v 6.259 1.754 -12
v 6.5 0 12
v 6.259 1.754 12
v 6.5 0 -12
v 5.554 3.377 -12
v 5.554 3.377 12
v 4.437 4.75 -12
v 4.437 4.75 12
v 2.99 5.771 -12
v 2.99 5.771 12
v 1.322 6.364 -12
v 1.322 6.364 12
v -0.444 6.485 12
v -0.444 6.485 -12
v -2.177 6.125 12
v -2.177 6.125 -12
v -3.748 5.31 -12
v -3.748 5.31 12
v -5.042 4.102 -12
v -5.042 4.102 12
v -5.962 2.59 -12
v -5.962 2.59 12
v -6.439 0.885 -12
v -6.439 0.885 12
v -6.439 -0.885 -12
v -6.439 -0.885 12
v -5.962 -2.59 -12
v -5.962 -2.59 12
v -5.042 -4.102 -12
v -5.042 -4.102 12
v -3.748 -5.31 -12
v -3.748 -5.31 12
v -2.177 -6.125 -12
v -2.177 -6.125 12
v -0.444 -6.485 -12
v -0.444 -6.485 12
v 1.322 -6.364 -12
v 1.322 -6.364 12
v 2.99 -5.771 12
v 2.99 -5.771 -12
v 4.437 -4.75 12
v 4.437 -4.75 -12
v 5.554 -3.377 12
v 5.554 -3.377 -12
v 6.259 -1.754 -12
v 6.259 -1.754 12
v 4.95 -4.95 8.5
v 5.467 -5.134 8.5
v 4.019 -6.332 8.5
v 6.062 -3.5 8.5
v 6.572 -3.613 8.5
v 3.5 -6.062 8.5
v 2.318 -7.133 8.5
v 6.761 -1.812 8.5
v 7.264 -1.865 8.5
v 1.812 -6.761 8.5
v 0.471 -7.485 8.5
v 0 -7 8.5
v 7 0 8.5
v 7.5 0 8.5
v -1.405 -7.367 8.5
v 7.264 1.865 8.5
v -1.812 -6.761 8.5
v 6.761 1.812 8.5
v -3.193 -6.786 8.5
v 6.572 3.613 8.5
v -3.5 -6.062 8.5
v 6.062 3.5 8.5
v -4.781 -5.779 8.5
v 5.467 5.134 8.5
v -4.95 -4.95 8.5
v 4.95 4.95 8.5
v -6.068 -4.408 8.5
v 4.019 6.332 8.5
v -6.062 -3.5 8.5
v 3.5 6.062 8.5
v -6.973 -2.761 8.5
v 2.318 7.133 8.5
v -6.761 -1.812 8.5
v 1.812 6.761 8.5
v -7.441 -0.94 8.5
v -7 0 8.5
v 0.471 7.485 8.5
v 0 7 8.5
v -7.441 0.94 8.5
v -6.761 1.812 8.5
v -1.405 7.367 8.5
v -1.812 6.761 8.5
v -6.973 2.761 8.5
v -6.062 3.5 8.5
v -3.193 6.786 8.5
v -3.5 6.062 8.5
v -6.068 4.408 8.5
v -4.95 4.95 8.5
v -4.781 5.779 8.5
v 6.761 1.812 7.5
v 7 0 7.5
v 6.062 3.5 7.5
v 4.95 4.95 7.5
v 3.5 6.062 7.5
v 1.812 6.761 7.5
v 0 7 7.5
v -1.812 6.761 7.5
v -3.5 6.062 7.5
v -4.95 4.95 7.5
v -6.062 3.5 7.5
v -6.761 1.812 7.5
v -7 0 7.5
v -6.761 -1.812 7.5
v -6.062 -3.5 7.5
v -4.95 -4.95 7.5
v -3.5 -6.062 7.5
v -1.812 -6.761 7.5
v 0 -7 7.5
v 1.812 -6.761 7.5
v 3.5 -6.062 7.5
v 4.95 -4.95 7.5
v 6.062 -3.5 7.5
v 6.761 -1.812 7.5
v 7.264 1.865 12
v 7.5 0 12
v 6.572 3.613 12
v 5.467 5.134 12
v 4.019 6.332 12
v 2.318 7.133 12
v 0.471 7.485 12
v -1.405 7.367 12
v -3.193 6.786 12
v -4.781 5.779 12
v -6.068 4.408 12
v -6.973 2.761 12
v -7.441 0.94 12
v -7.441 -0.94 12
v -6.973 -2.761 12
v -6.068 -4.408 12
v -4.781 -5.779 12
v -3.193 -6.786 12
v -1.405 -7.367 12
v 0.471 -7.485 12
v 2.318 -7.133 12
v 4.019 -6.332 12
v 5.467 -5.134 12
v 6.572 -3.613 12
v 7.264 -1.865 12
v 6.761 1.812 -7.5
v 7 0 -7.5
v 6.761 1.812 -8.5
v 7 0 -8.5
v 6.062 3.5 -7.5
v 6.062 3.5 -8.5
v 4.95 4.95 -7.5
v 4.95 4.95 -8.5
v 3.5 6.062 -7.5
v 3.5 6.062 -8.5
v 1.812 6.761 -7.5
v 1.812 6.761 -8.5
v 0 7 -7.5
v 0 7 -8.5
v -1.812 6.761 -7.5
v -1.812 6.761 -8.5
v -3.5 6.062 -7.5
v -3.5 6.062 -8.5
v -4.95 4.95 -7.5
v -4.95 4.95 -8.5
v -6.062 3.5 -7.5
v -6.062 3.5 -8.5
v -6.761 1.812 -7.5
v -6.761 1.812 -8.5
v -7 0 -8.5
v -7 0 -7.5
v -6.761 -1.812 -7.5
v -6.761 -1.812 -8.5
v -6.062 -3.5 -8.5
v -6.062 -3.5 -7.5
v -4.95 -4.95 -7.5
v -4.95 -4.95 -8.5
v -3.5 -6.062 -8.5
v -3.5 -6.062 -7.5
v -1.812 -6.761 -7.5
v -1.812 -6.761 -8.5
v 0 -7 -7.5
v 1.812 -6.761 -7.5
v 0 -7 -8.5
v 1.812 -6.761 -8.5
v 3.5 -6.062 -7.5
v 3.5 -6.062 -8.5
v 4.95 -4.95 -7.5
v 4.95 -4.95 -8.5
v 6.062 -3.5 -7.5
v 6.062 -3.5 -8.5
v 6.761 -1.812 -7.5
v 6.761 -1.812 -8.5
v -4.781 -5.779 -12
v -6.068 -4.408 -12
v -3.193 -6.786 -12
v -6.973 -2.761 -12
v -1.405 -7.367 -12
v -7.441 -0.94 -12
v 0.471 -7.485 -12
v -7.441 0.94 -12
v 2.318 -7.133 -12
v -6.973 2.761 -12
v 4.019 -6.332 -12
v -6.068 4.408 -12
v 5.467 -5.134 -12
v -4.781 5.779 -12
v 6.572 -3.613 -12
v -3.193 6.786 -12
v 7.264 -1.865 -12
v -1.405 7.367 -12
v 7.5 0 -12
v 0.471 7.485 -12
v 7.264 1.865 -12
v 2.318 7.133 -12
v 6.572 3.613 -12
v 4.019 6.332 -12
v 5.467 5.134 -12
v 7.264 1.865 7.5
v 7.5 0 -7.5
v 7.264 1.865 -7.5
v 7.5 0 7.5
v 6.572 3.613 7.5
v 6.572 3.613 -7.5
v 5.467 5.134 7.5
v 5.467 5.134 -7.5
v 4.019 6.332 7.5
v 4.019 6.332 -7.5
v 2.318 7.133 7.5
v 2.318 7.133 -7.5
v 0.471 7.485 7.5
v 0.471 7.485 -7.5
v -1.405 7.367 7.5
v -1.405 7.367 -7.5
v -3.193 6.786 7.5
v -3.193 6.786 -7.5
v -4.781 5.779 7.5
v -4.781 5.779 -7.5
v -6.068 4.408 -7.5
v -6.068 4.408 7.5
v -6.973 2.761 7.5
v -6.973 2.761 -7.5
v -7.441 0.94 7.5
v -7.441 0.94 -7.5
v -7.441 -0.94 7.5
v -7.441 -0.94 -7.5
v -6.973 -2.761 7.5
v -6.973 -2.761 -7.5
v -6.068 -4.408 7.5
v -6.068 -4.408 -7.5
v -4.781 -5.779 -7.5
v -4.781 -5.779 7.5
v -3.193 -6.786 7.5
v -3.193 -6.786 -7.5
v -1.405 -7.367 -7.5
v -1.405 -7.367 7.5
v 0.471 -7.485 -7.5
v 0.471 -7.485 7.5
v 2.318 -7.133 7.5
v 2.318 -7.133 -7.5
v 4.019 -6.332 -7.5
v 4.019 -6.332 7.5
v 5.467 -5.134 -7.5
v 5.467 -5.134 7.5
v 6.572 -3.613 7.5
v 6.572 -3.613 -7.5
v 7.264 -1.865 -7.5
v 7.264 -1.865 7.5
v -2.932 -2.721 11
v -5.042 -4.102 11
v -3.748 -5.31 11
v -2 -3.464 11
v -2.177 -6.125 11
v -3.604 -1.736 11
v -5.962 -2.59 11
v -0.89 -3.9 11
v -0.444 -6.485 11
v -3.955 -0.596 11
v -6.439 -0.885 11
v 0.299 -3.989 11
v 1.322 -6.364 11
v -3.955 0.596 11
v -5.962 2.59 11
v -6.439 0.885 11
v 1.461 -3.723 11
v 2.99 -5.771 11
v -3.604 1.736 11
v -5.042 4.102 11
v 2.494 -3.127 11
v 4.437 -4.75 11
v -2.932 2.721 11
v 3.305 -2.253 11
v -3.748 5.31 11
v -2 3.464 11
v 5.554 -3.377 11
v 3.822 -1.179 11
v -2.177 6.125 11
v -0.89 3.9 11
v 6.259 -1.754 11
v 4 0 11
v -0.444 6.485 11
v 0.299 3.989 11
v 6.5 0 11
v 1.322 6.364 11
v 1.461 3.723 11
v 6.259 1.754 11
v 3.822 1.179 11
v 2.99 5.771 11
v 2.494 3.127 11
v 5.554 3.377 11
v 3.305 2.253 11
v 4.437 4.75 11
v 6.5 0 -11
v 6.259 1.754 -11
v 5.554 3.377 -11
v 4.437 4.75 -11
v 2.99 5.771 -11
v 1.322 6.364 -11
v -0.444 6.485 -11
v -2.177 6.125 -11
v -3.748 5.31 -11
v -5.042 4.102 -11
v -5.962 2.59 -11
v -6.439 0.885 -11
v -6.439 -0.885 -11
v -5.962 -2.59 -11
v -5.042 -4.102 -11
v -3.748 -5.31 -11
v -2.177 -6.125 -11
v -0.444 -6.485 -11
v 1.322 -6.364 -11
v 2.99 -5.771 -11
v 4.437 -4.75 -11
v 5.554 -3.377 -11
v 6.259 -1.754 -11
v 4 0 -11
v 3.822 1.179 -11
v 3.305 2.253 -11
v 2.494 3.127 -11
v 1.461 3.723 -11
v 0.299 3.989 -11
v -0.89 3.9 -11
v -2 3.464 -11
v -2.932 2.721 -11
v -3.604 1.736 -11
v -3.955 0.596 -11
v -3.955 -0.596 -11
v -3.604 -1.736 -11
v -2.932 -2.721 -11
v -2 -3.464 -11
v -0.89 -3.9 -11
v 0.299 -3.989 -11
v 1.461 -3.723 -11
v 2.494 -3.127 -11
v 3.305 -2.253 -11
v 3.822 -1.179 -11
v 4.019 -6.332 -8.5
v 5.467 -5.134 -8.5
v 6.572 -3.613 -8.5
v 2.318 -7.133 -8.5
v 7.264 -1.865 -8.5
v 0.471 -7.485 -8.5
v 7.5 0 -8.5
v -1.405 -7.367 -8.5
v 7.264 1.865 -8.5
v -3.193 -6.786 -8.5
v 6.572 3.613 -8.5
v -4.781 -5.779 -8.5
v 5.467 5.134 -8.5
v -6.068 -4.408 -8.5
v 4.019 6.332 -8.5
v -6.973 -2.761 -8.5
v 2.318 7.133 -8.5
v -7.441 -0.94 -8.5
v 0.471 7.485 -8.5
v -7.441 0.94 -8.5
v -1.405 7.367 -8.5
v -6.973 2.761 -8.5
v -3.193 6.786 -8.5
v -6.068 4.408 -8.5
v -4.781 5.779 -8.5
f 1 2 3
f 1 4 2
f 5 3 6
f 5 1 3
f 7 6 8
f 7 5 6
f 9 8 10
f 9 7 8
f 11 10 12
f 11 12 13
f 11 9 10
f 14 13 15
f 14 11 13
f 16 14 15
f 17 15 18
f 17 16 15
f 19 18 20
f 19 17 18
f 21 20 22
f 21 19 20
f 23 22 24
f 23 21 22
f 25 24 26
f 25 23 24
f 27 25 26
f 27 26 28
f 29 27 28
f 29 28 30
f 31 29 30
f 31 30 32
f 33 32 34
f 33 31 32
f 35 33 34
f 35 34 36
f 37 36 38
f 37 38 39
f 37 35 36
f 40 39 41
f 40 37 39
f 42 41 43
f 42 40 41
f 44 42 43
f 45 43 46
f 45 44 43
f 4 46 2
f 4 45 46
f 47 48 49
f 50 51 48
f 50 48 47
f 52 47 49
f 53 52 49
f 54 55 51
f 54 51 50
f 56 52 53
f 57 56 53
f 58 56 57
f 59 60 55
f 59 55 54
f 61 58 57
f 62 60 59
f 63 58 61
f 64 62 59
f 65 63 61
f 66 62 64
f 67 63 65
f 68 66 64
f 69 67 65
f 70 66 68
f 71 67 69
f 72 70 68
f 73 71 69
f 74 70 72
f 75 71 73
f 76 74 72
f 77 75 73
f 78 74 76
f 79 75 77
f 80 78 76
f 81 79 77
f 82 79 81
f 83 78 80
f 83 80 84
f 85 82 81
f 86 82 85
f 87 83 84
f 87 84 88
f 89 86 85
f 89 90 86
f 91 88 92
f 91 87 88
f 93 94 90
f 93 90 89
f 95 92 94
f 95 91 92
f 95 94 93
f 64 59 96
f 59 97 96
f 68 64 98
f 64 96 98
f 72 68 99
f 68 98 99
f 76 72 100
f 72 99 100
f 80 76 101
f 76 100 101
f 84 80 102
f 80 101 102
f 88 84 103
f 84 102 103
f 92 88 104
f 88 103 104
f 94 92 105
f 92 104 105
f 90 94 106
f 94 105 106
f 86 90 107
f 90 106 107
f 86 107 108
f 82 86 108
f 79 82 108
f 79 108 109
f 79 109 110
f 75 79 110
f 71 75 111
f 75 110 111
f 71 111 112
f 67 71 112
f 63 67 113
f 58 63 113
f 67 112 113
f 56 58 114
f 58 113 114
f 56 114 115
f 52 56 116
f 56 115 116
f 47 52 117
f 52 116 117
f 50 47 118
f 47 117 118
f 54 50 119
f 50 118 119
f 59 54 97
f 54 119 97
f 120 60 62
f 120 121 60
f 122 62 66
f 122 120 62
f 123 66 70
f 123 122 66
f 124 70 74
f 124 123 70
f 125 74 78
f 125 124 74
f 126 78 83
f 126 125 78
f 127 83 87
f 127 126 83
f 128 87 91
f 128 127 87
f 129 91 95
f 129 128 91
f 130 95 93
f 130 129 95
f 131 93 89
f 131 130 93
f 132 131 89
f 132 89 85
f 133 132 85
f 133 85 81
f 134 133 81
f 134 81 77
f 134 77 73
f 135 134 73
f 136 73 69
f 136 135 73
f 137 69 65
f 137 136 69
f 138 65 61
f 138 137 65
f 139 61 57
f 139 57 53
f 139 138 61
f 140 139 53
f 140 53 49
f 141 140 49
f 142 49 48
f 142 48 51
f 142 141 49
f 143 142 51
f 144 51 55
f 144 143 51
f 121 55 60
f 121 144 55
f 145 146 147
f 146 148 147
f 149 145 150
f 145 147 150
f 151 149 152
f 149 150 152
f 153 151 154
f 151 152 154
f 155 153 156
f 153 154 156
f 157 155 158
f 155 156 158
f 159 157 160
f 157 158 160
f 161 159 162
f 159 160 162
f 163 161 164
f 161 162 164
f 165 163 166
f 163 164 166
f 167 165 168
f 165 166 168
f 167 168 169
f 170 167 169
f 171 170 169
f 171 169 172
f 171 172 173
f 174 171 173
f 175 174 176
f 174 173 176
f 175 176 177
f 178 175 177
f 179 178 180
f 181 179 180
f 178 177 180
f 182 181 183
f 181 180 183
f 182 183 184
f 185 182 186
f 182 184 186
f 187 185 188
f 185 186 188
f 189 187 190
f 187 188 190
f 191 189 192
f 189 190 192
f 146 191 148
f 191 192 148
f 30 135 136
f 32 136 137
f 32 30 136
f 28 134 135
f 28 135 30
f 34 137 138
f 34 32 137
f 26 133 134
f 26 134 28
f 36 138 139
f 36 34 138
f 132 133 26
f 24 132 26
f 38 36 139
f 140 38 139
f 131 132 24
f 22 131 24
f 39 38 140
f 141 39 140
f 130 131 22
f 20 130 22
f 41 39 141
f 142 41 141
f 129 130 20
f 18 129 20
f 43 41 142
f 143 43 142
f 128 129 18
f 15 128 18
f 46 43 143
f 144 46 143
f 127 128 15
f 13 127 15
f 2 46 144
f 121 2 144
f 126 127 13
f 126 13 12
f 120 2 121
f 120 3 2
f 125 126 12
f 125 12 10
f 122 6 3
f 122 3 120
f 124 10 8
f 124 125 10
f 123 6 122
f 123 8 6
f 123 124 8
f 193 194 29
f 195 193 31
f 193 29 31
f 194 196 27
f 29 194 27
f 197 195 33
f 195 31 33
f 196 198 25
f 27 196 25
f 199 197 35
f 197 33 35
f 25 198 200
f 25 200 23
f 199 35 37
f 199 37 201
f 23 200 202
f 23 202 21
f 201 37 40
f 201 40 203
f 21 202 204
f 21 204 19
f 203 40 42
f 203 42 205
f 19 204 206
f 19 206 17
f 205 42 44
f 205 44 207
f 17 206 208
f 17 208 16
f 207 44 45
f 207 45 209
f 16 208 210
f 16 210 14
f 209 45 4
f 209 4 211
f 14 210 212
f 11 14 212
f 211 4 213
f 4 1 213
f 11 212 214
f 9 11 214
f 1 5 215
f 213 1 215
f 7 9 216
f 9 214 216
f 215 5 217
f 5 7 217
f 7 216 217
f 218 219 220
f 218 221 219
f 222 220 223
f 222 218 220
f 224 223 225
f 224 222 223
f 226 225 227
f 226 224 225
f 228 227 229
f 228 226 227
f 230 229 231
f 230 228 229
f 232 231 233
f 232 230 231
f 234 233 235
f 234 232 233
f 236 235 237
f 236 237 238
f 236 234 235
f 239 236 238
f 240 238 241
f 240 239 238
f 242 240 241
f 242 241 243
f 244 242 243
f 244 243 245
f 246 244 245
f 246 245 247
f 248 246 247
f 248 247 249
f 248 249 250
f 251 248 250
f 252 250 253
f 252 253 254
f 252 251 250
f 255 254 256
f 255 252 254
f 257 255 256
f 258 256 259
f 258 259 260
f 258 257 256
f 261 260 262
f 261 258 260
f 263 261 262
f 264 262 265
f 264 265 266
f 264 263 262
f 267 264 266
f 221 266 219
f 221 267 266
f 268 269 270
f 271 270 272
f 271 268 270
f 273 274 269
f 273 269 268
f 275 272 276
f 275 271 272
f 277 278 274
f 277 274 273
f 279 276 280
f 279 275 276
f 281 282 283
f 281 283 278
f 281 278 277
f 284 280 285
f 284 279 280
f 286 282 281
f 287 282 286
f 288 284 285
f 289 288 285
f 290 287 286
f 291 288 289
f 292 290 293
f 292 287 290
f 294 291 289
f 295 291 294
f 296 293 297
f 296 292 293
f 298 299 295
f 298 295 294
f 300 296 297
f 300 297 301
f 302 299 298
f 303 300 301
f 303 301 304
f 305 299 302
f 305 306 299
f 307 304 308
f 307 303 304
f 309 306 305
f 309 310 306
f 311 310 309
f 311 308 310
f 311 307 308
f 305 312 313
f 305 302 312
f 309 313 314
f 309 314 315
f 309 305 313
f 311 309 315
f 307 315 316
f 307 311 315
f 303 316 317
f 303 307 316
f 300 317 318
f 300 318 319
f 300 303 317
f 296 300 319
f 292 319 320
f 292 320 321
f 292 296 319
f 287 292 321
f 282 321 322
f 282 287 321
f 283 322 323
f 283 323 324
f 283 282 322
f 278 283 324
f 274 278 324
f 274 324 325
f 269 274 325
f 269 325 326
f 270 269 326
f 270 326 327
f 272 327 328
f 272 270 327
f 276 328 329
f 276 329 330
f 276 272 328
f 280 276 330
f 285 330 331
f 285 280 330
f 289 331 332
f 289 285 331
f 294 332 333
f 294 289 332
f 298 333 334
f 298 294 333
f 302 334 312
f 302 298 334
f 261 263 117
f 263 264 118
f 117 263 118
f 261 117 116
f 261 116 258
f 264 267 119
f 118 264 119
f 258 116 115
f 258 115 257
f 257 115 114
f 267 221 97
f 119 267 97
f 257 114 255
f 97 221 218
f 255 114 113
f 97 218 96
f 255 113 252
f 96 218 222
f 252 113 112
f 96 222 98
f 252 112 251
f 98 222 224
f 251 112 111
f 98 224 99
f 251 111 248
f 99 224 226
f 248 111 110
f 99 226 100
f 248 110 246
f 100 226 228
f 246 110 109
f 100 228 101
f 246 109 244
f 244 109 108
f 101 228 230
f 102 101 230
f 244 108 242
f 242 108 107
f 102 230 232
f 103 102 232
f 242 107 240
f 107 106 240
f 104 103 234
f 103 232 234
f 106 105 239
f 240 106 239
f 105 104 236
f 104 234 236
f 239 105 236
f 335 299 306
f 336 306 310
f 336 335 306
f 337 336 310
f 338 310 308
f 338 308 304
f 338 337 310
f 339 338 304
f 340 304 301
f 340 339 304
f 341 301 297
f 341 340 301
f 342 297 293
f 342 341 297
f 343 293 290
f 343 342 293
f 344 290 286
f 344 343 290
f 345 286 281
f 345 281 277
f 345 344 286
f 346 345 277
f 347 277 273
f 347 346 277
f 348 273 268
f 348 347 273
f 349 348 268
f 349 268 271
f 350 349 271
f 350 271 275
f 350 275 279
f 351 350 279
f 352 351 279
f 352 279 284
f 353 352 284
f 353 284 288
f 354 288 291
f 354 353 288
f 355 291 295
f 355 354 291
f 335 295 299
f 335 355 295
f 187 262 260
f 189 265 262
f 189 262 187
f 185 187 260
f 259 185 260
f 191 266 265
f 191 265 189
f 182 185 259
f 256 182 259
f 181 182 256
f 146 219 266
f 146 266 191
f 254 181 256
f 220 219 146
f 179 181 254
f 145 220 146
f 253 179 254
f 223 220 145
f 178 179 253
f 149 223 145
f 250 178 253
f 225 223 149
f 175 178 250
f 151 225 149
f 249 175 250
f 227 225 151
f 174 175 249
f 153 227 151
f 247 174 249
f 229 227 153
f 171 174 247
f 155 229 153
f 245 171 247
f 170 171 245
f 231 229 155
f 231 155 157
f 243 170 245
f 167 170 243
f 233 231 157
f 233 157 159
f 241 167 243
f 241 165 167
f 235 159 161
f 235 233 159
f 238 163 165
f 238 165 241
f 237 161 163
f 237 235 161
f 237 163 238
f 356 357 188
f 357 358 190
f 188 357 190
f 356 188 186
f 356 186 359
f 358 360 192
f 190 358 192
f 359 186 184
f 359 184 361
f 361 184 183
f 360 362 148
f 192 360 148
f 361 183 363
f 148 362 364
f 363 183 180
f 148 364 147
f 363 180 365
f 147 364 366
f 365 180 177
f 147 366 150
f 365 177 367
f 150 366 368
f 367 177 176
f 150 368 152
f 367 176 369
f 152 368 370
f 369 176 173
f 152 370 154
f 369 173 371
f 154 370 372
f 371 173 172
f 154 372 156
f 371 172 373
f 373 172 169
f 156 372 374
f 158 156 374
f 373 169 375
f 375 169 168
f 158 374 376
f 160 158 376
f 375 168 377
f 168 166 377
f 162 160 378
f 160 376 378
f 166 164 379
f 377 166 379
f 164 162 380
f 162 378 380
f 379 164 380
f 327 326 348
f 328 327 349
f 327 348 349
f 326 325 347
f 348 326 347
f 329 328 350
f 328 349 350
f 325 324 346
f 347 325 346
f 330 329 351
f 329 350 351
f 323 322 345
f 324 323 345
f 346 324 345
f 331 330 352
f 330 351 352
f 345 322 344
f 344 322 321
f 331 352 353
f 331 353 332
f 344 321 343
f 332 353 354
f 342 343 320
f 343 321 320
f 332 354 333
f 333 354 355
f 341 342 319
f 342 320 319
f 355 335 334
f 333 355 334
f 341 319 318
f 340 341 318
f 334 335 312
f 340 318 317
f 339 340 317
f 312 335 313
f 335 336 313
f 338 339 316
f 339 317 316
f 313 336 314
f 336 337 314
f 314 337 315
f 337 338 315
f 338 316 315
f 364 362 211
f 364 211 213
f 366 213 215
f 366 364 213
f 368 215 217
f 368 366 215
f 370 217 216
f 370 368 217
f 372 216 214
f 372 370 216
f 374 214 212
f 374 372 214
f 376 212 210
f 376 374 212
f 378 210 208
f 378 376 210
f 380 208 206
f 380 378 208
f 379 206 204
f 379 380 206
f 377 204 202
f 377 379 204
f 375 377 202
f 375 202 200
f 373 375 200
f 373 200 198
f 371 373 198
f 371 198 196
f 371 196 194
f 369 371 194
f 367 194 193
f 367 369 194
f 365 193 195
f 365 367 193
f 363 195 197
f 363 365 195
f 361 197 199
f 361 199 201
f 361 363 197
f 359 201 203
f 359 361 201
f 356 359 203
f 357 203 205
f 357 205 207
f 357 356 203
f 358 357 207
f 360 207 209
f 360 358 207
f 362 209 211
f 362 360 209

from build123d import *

# Parameters (mm, degrees)
SKETCH1_R           = 7.5
SKETCH1_R_2         = 6.5
BOSS_EXTRUDE1_DEPTH = 12
SKETCH2_R           = 6.5
SKETCH2_R_2         = 4
BOSS_EXTRUDE2_DEPTH = 11
SKETCH3_W           = 0.5
SKETCH3_H           = 1


with BuildPart() as part:
    # Sketch1 → Boss-Extrude1 (new body, symmetric)
    with BuildSketch(Plane.XY):
        Circle(SKETCH1_R)
        Circle(SKETCH1_R_2, mode=Mode.SUBTRACT)
    extrude(amount=BOSS_EXTRUDE1_DEPTH, both=True)

    # Sketch3 → Cut-Revolve1 (revolve, cut)
    with BuildSketch(Plane(origin=(0, 0, 0), x_dir=(1, 0, 0), z_dir=(0, 1, 0))):
        with Locations((7.25, 8)):
            Rectangle(SKETCH3_W, SKETCH3_H)
        with Locations((7.25, -8)):
            Rectangle(SKETCH3_W, SKETCH3_H)
    revolve(axis=Axis((0, 0, -12), (0, 0, 1)), mode=Mode.SUBTRACT)


with BuildPart() as body_2:
    # Sketch2 → Boss-Extrude2 (new body, symmetric)
    with BuildSketch(Plane.XY):
        Circle(SKETCH2_R)
        Circle(SKETCH2_R_2, mode=Mode.SUBTRACT)
    extrude(amount=BOSS_EXTRUDE2_DEPTH, both=True)


solid = Compound([part.part, body_2.part])
